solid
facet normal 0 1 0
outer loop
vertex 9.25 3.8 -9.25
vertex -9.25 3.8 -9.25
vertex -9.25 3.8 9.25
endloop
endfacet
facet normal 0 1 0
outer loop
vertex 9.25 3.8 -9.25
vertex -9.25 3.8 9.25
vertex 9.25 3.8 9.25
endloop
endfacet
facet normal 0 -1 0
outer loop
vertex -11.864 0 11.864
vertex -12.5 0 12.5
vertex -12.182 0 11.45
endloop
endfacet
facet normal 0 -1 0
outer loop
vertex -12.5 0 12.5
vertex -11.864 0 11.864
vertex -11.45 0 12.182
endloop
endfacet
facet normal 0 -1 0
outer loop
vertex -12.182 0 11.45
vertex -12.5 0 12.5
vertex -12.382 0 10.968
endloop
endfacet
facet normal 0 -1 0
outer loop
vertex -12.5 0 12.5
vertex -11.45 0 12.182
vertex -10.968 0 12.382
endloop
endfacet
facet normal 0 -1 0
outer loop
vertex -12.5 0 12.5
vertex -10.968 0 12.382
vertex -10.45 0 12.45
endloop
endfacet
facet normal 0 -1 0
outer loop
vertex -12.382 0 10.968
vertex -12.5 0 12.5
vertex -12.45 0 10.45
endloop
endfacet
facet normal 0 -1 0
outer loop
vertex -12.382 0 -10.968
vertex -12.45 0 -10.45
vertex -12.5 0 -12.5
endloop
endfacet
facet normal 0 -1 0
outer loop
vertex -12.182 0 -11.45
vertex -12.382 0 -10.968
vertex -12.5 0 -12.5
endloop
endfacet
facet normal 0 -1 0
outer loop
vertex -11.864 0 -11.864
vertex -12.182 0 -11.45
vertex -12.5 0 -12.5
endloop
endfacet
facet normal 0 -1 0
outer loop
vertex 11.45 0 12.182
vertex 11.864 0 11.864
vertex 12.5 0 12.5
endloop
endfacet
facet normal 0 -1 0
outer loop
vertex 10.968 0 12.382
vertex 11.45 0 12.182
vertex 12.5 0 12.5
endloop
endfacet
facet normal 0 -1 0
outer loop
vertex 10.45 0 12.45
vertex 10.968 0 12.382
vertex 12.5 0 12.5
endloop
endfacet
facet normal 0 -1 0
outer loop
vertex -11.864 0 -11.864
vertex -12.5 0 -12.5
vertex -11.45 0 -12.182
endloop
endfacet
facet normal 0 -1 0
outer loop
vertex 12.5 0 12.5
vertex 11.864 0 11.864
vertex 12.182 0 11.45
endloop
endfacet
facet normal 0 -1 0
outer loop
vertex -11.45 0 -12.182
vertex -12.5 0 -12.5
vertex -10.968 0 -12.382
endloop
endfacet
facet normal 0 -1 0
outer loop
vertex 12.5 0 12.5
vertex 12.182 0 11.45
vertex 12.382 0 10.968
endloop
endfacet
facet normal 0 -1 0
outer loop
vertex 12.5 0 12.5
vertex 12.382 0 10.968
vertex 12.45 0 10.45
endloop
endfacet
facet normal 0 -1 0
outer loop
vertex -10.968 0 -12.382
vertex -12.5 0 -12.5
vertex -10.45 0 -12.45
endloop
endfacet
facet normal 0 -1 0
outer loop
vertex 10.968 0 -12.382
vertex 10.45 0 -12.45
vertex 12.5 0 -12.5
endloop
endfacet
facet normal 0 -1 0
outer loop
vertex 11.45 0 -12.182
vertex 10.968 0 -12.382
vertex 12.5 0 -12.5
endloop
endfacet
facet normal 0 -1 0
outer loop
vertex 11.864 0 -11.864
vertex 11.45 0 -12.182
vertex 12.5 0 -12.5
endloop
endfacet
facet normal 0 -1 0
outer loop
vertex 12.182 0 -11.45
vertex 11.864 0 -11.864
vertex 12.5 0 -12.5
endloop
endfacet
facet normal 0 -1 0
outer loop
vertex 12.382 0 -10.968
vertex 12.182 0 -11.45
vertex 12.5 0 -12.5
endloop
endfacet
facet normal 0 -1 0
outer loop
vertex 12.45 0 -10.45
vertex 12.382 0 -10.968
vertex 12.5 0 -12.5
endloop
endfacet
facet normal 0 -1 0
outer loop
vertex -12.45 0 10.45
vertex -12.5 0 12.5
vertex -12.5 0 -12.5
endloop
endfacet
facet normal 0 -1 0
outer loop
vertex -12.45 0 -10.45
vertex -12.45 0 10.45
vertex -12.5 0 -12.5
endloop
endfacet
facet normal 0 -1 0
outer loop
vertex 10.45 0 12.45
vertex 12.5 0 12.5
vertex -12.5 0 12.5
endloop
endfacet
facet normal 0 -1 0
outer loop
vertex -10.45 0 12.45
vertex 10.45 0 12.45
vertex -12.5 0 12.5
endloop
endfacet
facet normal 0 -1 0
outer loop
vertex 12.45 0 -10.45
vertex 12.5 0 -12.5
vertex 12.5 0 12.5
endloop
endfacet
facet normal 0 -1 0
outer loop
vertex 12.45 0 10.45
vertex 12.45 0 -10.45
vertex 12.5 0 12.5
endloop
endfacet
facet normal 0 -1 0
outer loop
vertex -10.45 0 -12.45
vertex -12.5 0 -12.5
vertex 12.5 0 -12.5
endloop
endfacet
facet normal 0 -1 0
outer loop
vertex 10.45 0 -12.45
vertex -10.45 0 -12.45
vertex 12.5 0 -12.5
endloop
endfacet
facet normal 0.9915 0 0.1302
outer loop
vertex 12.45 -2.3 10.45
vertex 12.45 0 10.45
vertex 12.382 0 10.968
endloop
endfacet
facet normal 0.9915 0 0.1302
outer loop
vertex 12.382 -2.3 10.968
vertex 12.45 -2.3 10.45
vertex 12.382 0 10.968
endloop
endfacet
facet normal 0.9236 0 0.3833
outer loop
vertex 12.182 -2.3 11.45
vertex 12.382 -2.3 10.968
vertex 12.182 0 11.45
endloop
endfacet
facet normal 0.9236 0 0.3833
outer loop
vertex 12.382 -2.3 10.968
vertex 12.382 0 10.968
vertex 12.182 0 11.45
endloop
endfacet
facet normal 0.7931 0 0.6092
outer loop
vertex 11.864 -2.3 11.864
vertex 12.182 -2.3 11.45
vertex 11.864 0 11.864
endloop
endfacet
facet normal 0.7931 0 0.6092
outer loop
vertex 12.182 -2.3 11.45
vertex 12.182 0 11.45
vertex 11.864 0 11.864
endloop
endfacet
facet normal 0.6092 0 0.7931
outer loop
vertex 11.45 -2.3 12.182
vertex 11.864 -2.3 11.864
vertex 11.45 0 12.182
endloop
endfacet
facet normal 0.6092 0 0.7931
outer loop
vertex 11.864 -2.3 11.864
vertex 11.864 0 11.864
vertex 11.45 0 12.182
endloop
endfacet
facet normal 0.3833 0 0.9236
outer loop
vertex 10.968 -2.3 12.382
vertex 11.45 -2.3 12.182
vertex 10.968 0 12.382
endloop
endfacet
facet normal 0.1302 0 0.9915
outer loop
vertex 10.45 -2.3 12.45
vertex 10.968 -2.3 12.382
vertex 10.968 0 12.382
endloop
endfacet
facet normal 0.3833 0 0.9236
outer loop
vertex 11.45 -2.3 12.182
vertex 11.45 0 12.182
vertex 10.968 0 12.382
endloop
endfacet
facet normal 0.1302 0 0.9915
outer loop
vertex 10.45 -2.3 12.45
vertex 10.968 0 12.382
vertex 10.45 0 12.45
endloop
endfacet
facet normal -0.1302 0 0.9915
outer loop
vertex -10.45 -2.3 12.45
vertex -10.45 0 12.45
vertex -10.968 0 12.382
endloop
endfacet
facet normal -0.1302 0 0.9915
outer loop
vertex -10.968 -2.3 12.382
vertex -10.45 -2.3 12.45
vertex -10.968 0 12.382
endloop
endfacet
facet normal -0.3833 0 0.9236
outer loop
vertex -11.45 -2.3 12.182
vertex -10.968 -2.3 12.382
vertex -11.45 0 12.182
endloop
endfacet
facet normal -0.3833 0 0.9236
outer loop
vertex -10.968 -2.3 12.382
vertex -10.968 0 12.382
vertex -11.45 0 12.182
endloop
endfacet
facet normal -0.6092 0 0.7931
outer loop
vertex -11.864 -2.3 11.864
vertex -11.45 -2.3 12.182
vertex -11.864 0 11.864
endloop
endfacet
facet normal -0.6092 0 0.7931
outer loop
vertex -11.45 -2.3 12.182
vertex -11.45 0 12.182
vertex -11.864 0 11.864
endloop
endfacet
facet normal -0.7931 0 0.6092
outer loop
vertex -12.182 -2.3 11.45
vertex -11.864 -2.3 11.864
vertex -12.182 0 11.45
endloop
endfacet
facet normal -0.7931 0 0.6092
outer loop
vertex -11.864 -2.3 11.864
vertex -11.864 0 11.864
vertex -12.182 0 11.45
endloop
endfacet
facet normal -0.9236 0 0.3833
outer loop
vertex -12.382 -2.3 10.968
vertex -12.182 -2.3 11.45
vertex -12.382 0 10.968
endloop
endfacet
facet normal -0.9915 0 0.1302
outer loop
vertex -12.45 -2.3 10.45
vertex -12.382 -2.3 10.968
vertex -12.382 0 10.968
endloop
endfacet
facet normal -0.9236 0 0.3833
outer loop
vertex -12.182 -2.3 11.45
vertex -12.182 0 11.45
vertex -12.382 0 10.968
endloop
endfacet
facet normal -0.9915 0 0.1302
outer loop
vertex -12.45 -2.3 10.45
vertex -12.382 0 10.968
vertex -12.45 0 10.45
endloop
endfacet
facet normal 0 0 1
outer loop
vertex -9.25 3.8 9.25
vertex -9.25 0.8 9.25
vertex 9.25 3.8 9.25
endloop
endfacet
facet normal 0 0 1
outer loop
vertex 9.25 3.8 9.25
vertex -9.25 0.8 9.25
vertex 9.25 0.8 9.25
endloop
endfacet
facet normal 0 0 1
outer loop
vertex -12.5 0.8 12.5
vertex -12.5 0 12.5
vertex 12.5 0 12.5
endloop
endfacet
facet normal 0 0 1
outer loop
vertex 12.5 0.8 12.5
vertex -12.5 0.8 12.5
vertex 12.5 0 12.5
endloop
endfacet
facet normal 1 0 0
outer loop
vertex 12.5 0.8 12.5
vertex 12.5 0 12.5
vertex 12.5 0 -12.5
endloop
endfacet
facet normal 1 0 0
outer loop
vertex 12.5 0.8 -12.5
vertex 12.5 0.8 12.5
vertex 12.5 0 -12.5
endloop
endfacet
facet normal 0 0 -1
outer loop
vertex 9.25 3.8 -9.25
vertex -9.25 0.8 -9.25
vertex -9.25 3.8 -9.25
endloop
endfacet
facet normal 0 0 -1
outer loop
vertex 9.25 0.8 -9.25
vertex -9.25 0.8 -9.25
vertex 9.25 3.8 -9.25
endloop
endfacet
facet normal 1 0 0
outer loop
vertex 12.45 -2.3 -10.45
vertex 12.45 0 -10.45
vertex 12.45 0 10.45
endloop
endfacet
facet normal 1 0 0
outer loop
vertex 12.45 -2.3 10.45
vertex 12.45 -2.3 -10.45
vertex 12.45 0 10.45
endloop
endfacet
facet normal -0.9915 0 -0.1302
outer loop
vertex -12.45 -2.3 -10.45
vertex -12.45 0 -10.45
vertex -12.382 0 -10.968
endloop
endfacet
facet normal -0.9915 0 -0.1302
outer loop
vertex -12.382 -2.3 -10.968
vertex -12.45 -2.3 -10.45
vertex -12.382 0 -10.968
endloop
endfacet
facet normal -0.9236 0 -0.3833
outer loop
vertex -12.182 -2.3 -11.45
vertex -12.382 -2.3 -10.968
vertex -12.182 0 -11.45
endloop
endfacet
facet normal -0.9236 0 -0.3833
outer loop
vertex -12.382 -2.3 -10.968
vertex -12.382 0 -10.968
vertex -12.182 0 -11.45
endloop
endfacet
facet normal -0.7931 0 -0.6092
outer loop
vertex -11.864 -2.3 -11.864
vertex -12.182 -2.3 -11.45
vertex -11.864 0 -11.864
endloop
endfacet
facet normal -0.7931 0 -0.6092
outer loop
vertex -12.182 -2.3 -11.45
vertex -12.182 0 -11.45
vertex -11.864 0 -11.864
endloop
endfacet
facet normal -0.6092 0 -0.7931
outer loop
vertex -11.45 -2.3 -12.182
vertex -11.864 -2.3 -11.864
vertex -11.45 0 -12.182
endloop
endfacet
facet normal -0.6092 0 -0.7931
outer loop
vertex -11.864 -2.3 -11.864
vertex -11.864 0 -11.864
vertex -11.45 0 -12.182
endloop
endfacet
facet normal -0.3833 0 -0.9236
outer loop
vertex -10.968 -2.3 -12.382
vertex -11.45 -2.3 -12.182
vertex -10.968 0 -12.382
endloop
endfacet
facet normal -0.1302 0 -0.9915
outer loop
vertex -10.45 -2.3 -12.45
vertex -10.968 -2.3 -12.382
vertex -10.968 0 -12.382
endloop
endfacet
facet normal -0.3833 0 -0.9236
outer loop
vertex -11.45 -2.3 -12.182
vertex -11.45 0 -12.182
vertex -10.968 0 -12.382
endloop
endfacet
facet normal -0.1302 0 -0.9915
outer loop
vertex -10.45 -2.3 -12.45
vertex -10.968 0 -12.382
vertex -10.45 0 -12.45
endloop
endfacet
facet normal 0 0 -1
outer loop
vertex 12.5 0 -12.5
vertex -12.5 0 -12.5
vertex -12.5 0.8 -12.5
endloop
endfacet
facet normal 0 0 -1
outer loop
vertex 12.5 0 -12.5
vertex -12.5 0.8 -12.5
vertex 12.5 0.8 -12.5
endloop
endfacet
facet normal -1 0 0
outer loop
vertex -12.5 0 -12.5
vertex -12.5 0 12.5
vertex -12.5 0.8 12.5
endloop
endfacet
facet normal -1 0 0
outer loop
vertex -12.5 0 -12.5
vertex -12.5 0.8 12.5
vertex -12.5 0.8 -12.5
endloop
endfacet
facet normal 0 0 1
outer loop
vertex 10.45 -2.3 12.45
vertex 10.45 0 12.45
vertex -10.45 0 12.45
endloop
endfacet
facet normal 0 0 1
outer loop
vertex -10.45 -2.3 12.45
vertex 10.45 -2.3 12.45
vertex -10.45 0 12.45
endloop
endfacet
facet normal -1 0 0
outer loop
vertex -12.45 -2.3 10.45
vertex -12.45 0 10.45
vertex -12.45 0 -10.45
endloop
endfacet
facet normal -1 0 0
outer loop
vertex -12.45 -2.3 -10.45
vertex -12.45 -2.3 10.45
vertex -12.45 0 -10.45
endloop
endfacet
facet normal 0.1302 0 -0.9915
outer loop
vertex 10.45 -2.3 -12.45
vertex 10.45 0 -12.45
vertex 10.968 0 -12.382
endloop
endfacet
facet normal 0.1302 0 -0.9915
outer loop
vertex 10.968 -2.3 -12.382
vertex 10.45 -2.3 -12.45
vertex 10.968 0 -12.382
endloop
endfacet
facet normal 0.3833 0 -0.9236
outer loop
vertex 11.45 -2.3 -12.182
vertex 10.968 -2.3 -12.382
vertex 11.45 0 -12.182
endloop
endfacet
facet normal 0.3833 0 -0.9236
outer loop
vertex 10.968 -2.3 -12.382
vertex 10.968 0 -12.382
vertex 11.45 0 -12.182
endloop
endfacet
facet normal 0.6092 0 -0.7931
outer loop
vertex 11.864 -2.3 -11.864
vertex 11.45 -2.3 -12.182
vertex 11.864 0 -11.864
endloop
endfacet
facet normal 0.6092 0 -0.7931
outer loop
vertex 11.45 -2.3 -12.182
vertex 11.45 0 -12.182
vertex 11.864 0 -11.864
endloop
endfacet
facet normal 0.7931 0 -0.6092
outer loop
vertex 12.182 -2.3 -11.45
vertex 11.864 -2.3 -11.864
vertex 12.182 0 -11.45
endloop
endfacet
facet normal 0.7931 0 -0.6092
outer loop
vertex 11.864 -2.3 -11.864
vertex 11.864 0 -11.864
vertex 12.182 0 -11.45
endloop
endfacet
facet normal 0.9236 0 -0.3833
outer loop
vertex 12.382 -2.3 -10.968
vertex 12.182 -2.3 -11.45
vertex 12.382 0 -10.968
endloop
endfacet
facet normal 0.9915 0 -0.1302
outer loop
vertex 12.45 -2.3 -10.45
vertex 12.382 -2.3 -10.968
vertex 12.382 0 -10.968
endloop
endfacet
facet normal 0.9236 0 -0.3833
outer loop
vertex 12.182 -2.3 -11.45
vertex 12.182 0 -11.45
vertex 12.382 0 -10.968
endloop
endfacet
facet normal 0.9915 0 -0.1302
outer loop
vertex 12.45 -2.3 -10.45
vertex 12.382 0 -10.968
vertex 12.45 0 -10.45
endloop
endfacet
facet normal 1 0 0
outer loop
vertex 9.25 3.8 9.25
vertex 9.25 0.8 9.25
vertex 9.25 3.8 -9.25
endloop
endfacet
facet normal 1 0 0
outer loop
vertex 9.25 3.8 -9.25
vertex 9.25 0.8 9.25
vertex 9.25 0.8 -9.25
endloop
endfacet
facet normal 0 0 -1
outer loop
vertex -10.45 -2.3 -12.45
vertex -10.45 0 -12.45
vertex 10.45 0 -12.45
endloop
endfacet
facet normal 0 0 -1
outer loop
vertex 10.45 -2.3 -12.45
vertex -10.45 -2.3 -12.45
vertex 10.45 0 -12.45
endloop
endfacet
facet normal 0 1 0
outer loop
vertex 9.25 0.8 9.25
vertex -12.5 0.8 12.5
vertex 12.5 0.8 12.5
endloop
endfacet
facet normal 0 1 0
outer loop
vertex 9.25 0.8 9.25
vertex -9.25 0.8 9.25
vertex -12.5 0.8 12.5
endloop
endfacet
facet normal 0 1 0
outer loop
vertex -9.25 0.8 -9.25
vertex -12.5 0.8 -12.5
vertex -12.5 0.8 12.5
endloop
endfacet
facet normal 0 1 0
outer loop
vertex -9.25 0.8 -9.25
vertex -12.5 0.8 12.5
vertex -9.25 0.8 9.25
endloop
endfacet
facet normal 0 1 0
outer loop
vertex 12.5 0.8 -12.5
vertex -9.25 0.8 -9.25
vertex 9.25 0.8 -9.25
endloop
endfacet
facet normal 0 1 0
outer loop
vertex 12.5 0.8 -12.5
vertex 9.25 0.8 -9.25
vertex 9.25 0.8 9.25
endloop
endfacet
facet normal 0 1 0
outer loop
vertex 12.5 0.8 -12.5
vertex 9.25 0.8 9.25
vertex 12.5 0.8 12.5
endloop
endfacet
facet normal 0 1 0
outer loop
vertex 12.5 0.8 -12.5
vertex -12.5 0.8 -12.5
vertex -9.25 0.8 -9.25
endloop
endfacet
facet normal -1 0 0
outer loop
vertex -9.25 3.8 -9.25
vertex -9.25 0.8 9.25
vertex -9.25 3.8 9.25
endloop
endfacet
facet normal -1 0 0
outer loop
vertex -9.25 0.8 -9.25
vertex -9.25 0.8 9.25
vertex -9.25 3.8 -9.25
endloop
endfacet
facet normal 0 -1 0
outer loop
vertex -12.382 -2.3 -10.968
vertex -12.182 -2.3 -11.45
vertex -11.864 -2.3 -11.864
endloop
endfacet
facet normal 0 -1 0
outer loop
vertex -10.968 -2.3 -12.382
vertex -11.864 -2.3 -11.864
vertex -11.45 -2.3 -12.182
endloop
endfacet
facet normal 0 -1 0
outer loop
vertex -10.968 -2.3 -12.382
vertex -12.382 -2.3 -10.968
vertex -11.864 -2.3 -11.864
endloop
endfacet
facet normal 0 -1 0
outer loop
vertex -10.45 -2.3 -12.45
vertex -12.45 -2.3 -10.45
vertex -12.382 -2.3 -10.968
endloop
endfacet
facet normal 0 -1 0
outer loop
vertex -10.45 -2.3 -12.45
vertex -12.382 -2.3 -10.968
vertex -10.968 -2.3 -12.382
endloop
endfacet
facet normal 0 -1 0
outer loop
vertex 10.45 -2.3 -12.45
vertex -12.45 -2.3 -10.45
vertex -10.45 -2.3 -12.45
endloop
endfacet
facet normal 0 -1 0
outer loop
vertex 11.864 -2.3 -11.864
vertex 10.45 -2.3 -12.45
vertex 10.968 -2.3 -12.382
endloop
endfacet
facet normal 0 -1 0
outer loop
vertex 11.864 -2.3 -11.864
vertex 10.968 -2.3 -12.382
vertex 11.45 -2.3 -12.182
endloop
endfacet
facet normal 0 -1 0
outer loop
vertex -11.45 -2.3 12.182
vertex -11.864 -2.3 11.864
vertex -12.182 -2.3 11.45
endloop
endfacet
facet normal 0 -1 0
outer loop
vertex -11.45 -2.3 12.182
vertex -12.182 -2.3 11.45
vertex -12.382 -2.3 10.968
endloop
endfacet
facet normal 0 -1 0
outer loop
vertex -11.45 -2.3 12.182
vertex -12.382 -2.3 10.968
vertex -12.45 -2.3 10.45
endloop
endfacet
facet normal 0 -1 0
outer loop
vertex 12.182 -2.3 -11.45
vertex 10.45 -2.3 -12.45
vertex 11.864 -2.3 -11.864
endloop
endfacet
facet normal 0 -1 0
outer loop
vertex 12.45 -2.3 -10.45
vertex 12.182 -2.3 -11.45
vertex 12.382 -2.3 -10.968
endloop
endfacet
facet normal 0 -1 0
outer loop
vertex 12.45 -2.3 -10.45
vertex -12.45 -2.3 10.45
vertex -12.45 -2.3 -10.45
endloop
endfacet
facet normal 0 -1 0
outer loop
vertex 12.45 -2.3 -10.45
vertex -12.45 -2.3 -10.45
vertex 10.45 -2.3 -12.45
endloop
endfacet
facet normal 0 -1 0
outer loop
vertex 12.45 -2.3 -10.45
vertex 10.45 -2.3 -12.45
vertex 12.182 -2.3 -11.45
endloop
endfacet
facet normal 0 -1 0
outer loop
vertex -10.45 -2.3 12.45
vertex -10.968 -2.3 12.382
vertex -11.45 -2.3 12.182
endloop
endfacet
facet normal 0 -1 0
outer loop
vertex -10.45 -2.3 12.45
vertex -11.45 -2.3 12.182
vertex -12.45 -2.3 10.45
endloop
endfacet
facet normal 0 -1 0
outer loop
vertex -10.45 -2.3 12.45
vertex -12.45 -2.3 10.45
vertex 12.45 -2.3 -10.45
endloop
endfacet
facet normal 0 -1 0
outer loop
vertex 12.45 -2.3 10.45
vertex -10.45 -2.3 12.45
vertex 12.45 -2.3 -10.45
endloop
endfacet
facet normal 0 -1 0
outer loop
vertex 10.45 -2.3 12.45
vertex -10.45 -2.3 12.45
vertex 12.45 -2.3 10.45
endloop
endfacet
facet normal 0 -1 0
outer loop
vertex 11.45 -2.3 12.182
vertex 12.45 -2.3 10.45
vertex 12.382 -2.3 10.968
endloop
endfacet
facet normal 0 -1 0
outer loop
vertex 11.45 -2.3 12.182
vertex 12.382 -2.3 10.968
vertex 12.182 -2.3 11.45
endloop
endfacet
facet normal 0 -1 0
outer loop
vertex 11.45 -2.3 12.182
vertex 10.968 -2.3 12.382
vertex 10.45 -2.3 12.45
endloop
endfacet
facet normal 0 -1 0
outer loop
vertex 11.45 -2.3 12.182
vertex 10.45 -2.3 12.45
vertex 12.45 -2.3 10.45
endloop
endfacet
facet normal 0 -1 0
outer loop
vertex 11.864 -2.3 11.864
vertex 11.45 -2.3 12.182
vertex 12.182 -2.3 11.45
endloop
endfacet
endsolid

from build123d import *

# Parameters (mm, degrees)
SKETCH1_W           = 25
SKETCH1_H           = 25
BOSS_EXTRUDE1_DEPTH = 0.8
SKETCH2_W           = 18.5
SKETCH2_H           = 18.5
BOSS_EXTRUDE2_DEPTH = 3
BOSS_EXTRUDE4_DEPTH = 2.3


with BuildPart() as part:
    # Sketch1 → Boss-Extrude1 (new body)
    with BuildSketch(Plane(origin=(0, 0, 0), x_dir=(1, 0, 0), z_dir=(0, 1, 0))):
        Rectangle(SKETCH1_W, SKETCH1_H)
    extrude(amount=BOSS_EXTRUDE1_DEPTH)

    # Sketch2 → Boss-Extrude2 (add)
    with BuildSketch(Plane(origin=(0, 0.8, 0), x_dir=(1, 0, 0), z_dir=(0, 1, 0))):
        Rectangle(SKETCH2_W, SKETCH2_H)
    extrude(amount=BOSS_EXTRUDE2_DEPTH)

    # Sketch3 → Boss-Extrude4 (add)
    with BuildSketch(Plane.XZ):
        with BuildLine():
            Line((-10.45, -12.45), (10.45, -12.45))
            ThreePointArc((10.45, -12.45), (11.864213562, -11.864213562), (12.45, -10.45))
            Line((12.45, -10.45), (12.45, 10.45))
            ThreePointArc((12.45, 10.45), (11.864213562, 11.864213562), (10.45, 12.45))
            Line((10.45, 12.45), (-10.45, 12.45))
            ThreePointArc((-10.45, 12.45), (-11.864213562, 11.864213562), (-12.45, 10.45))
            Line((-12.45, 10.45), (-12.45, -10.45))
            ThreePointArc((-12.45, -10.45), (-11.864213562, -11.864213562), (-10.45, -12.45))
        make_face()
    extrude(amount=BOSS_EXTRUDE4_DEPTH)


solid = part.part
